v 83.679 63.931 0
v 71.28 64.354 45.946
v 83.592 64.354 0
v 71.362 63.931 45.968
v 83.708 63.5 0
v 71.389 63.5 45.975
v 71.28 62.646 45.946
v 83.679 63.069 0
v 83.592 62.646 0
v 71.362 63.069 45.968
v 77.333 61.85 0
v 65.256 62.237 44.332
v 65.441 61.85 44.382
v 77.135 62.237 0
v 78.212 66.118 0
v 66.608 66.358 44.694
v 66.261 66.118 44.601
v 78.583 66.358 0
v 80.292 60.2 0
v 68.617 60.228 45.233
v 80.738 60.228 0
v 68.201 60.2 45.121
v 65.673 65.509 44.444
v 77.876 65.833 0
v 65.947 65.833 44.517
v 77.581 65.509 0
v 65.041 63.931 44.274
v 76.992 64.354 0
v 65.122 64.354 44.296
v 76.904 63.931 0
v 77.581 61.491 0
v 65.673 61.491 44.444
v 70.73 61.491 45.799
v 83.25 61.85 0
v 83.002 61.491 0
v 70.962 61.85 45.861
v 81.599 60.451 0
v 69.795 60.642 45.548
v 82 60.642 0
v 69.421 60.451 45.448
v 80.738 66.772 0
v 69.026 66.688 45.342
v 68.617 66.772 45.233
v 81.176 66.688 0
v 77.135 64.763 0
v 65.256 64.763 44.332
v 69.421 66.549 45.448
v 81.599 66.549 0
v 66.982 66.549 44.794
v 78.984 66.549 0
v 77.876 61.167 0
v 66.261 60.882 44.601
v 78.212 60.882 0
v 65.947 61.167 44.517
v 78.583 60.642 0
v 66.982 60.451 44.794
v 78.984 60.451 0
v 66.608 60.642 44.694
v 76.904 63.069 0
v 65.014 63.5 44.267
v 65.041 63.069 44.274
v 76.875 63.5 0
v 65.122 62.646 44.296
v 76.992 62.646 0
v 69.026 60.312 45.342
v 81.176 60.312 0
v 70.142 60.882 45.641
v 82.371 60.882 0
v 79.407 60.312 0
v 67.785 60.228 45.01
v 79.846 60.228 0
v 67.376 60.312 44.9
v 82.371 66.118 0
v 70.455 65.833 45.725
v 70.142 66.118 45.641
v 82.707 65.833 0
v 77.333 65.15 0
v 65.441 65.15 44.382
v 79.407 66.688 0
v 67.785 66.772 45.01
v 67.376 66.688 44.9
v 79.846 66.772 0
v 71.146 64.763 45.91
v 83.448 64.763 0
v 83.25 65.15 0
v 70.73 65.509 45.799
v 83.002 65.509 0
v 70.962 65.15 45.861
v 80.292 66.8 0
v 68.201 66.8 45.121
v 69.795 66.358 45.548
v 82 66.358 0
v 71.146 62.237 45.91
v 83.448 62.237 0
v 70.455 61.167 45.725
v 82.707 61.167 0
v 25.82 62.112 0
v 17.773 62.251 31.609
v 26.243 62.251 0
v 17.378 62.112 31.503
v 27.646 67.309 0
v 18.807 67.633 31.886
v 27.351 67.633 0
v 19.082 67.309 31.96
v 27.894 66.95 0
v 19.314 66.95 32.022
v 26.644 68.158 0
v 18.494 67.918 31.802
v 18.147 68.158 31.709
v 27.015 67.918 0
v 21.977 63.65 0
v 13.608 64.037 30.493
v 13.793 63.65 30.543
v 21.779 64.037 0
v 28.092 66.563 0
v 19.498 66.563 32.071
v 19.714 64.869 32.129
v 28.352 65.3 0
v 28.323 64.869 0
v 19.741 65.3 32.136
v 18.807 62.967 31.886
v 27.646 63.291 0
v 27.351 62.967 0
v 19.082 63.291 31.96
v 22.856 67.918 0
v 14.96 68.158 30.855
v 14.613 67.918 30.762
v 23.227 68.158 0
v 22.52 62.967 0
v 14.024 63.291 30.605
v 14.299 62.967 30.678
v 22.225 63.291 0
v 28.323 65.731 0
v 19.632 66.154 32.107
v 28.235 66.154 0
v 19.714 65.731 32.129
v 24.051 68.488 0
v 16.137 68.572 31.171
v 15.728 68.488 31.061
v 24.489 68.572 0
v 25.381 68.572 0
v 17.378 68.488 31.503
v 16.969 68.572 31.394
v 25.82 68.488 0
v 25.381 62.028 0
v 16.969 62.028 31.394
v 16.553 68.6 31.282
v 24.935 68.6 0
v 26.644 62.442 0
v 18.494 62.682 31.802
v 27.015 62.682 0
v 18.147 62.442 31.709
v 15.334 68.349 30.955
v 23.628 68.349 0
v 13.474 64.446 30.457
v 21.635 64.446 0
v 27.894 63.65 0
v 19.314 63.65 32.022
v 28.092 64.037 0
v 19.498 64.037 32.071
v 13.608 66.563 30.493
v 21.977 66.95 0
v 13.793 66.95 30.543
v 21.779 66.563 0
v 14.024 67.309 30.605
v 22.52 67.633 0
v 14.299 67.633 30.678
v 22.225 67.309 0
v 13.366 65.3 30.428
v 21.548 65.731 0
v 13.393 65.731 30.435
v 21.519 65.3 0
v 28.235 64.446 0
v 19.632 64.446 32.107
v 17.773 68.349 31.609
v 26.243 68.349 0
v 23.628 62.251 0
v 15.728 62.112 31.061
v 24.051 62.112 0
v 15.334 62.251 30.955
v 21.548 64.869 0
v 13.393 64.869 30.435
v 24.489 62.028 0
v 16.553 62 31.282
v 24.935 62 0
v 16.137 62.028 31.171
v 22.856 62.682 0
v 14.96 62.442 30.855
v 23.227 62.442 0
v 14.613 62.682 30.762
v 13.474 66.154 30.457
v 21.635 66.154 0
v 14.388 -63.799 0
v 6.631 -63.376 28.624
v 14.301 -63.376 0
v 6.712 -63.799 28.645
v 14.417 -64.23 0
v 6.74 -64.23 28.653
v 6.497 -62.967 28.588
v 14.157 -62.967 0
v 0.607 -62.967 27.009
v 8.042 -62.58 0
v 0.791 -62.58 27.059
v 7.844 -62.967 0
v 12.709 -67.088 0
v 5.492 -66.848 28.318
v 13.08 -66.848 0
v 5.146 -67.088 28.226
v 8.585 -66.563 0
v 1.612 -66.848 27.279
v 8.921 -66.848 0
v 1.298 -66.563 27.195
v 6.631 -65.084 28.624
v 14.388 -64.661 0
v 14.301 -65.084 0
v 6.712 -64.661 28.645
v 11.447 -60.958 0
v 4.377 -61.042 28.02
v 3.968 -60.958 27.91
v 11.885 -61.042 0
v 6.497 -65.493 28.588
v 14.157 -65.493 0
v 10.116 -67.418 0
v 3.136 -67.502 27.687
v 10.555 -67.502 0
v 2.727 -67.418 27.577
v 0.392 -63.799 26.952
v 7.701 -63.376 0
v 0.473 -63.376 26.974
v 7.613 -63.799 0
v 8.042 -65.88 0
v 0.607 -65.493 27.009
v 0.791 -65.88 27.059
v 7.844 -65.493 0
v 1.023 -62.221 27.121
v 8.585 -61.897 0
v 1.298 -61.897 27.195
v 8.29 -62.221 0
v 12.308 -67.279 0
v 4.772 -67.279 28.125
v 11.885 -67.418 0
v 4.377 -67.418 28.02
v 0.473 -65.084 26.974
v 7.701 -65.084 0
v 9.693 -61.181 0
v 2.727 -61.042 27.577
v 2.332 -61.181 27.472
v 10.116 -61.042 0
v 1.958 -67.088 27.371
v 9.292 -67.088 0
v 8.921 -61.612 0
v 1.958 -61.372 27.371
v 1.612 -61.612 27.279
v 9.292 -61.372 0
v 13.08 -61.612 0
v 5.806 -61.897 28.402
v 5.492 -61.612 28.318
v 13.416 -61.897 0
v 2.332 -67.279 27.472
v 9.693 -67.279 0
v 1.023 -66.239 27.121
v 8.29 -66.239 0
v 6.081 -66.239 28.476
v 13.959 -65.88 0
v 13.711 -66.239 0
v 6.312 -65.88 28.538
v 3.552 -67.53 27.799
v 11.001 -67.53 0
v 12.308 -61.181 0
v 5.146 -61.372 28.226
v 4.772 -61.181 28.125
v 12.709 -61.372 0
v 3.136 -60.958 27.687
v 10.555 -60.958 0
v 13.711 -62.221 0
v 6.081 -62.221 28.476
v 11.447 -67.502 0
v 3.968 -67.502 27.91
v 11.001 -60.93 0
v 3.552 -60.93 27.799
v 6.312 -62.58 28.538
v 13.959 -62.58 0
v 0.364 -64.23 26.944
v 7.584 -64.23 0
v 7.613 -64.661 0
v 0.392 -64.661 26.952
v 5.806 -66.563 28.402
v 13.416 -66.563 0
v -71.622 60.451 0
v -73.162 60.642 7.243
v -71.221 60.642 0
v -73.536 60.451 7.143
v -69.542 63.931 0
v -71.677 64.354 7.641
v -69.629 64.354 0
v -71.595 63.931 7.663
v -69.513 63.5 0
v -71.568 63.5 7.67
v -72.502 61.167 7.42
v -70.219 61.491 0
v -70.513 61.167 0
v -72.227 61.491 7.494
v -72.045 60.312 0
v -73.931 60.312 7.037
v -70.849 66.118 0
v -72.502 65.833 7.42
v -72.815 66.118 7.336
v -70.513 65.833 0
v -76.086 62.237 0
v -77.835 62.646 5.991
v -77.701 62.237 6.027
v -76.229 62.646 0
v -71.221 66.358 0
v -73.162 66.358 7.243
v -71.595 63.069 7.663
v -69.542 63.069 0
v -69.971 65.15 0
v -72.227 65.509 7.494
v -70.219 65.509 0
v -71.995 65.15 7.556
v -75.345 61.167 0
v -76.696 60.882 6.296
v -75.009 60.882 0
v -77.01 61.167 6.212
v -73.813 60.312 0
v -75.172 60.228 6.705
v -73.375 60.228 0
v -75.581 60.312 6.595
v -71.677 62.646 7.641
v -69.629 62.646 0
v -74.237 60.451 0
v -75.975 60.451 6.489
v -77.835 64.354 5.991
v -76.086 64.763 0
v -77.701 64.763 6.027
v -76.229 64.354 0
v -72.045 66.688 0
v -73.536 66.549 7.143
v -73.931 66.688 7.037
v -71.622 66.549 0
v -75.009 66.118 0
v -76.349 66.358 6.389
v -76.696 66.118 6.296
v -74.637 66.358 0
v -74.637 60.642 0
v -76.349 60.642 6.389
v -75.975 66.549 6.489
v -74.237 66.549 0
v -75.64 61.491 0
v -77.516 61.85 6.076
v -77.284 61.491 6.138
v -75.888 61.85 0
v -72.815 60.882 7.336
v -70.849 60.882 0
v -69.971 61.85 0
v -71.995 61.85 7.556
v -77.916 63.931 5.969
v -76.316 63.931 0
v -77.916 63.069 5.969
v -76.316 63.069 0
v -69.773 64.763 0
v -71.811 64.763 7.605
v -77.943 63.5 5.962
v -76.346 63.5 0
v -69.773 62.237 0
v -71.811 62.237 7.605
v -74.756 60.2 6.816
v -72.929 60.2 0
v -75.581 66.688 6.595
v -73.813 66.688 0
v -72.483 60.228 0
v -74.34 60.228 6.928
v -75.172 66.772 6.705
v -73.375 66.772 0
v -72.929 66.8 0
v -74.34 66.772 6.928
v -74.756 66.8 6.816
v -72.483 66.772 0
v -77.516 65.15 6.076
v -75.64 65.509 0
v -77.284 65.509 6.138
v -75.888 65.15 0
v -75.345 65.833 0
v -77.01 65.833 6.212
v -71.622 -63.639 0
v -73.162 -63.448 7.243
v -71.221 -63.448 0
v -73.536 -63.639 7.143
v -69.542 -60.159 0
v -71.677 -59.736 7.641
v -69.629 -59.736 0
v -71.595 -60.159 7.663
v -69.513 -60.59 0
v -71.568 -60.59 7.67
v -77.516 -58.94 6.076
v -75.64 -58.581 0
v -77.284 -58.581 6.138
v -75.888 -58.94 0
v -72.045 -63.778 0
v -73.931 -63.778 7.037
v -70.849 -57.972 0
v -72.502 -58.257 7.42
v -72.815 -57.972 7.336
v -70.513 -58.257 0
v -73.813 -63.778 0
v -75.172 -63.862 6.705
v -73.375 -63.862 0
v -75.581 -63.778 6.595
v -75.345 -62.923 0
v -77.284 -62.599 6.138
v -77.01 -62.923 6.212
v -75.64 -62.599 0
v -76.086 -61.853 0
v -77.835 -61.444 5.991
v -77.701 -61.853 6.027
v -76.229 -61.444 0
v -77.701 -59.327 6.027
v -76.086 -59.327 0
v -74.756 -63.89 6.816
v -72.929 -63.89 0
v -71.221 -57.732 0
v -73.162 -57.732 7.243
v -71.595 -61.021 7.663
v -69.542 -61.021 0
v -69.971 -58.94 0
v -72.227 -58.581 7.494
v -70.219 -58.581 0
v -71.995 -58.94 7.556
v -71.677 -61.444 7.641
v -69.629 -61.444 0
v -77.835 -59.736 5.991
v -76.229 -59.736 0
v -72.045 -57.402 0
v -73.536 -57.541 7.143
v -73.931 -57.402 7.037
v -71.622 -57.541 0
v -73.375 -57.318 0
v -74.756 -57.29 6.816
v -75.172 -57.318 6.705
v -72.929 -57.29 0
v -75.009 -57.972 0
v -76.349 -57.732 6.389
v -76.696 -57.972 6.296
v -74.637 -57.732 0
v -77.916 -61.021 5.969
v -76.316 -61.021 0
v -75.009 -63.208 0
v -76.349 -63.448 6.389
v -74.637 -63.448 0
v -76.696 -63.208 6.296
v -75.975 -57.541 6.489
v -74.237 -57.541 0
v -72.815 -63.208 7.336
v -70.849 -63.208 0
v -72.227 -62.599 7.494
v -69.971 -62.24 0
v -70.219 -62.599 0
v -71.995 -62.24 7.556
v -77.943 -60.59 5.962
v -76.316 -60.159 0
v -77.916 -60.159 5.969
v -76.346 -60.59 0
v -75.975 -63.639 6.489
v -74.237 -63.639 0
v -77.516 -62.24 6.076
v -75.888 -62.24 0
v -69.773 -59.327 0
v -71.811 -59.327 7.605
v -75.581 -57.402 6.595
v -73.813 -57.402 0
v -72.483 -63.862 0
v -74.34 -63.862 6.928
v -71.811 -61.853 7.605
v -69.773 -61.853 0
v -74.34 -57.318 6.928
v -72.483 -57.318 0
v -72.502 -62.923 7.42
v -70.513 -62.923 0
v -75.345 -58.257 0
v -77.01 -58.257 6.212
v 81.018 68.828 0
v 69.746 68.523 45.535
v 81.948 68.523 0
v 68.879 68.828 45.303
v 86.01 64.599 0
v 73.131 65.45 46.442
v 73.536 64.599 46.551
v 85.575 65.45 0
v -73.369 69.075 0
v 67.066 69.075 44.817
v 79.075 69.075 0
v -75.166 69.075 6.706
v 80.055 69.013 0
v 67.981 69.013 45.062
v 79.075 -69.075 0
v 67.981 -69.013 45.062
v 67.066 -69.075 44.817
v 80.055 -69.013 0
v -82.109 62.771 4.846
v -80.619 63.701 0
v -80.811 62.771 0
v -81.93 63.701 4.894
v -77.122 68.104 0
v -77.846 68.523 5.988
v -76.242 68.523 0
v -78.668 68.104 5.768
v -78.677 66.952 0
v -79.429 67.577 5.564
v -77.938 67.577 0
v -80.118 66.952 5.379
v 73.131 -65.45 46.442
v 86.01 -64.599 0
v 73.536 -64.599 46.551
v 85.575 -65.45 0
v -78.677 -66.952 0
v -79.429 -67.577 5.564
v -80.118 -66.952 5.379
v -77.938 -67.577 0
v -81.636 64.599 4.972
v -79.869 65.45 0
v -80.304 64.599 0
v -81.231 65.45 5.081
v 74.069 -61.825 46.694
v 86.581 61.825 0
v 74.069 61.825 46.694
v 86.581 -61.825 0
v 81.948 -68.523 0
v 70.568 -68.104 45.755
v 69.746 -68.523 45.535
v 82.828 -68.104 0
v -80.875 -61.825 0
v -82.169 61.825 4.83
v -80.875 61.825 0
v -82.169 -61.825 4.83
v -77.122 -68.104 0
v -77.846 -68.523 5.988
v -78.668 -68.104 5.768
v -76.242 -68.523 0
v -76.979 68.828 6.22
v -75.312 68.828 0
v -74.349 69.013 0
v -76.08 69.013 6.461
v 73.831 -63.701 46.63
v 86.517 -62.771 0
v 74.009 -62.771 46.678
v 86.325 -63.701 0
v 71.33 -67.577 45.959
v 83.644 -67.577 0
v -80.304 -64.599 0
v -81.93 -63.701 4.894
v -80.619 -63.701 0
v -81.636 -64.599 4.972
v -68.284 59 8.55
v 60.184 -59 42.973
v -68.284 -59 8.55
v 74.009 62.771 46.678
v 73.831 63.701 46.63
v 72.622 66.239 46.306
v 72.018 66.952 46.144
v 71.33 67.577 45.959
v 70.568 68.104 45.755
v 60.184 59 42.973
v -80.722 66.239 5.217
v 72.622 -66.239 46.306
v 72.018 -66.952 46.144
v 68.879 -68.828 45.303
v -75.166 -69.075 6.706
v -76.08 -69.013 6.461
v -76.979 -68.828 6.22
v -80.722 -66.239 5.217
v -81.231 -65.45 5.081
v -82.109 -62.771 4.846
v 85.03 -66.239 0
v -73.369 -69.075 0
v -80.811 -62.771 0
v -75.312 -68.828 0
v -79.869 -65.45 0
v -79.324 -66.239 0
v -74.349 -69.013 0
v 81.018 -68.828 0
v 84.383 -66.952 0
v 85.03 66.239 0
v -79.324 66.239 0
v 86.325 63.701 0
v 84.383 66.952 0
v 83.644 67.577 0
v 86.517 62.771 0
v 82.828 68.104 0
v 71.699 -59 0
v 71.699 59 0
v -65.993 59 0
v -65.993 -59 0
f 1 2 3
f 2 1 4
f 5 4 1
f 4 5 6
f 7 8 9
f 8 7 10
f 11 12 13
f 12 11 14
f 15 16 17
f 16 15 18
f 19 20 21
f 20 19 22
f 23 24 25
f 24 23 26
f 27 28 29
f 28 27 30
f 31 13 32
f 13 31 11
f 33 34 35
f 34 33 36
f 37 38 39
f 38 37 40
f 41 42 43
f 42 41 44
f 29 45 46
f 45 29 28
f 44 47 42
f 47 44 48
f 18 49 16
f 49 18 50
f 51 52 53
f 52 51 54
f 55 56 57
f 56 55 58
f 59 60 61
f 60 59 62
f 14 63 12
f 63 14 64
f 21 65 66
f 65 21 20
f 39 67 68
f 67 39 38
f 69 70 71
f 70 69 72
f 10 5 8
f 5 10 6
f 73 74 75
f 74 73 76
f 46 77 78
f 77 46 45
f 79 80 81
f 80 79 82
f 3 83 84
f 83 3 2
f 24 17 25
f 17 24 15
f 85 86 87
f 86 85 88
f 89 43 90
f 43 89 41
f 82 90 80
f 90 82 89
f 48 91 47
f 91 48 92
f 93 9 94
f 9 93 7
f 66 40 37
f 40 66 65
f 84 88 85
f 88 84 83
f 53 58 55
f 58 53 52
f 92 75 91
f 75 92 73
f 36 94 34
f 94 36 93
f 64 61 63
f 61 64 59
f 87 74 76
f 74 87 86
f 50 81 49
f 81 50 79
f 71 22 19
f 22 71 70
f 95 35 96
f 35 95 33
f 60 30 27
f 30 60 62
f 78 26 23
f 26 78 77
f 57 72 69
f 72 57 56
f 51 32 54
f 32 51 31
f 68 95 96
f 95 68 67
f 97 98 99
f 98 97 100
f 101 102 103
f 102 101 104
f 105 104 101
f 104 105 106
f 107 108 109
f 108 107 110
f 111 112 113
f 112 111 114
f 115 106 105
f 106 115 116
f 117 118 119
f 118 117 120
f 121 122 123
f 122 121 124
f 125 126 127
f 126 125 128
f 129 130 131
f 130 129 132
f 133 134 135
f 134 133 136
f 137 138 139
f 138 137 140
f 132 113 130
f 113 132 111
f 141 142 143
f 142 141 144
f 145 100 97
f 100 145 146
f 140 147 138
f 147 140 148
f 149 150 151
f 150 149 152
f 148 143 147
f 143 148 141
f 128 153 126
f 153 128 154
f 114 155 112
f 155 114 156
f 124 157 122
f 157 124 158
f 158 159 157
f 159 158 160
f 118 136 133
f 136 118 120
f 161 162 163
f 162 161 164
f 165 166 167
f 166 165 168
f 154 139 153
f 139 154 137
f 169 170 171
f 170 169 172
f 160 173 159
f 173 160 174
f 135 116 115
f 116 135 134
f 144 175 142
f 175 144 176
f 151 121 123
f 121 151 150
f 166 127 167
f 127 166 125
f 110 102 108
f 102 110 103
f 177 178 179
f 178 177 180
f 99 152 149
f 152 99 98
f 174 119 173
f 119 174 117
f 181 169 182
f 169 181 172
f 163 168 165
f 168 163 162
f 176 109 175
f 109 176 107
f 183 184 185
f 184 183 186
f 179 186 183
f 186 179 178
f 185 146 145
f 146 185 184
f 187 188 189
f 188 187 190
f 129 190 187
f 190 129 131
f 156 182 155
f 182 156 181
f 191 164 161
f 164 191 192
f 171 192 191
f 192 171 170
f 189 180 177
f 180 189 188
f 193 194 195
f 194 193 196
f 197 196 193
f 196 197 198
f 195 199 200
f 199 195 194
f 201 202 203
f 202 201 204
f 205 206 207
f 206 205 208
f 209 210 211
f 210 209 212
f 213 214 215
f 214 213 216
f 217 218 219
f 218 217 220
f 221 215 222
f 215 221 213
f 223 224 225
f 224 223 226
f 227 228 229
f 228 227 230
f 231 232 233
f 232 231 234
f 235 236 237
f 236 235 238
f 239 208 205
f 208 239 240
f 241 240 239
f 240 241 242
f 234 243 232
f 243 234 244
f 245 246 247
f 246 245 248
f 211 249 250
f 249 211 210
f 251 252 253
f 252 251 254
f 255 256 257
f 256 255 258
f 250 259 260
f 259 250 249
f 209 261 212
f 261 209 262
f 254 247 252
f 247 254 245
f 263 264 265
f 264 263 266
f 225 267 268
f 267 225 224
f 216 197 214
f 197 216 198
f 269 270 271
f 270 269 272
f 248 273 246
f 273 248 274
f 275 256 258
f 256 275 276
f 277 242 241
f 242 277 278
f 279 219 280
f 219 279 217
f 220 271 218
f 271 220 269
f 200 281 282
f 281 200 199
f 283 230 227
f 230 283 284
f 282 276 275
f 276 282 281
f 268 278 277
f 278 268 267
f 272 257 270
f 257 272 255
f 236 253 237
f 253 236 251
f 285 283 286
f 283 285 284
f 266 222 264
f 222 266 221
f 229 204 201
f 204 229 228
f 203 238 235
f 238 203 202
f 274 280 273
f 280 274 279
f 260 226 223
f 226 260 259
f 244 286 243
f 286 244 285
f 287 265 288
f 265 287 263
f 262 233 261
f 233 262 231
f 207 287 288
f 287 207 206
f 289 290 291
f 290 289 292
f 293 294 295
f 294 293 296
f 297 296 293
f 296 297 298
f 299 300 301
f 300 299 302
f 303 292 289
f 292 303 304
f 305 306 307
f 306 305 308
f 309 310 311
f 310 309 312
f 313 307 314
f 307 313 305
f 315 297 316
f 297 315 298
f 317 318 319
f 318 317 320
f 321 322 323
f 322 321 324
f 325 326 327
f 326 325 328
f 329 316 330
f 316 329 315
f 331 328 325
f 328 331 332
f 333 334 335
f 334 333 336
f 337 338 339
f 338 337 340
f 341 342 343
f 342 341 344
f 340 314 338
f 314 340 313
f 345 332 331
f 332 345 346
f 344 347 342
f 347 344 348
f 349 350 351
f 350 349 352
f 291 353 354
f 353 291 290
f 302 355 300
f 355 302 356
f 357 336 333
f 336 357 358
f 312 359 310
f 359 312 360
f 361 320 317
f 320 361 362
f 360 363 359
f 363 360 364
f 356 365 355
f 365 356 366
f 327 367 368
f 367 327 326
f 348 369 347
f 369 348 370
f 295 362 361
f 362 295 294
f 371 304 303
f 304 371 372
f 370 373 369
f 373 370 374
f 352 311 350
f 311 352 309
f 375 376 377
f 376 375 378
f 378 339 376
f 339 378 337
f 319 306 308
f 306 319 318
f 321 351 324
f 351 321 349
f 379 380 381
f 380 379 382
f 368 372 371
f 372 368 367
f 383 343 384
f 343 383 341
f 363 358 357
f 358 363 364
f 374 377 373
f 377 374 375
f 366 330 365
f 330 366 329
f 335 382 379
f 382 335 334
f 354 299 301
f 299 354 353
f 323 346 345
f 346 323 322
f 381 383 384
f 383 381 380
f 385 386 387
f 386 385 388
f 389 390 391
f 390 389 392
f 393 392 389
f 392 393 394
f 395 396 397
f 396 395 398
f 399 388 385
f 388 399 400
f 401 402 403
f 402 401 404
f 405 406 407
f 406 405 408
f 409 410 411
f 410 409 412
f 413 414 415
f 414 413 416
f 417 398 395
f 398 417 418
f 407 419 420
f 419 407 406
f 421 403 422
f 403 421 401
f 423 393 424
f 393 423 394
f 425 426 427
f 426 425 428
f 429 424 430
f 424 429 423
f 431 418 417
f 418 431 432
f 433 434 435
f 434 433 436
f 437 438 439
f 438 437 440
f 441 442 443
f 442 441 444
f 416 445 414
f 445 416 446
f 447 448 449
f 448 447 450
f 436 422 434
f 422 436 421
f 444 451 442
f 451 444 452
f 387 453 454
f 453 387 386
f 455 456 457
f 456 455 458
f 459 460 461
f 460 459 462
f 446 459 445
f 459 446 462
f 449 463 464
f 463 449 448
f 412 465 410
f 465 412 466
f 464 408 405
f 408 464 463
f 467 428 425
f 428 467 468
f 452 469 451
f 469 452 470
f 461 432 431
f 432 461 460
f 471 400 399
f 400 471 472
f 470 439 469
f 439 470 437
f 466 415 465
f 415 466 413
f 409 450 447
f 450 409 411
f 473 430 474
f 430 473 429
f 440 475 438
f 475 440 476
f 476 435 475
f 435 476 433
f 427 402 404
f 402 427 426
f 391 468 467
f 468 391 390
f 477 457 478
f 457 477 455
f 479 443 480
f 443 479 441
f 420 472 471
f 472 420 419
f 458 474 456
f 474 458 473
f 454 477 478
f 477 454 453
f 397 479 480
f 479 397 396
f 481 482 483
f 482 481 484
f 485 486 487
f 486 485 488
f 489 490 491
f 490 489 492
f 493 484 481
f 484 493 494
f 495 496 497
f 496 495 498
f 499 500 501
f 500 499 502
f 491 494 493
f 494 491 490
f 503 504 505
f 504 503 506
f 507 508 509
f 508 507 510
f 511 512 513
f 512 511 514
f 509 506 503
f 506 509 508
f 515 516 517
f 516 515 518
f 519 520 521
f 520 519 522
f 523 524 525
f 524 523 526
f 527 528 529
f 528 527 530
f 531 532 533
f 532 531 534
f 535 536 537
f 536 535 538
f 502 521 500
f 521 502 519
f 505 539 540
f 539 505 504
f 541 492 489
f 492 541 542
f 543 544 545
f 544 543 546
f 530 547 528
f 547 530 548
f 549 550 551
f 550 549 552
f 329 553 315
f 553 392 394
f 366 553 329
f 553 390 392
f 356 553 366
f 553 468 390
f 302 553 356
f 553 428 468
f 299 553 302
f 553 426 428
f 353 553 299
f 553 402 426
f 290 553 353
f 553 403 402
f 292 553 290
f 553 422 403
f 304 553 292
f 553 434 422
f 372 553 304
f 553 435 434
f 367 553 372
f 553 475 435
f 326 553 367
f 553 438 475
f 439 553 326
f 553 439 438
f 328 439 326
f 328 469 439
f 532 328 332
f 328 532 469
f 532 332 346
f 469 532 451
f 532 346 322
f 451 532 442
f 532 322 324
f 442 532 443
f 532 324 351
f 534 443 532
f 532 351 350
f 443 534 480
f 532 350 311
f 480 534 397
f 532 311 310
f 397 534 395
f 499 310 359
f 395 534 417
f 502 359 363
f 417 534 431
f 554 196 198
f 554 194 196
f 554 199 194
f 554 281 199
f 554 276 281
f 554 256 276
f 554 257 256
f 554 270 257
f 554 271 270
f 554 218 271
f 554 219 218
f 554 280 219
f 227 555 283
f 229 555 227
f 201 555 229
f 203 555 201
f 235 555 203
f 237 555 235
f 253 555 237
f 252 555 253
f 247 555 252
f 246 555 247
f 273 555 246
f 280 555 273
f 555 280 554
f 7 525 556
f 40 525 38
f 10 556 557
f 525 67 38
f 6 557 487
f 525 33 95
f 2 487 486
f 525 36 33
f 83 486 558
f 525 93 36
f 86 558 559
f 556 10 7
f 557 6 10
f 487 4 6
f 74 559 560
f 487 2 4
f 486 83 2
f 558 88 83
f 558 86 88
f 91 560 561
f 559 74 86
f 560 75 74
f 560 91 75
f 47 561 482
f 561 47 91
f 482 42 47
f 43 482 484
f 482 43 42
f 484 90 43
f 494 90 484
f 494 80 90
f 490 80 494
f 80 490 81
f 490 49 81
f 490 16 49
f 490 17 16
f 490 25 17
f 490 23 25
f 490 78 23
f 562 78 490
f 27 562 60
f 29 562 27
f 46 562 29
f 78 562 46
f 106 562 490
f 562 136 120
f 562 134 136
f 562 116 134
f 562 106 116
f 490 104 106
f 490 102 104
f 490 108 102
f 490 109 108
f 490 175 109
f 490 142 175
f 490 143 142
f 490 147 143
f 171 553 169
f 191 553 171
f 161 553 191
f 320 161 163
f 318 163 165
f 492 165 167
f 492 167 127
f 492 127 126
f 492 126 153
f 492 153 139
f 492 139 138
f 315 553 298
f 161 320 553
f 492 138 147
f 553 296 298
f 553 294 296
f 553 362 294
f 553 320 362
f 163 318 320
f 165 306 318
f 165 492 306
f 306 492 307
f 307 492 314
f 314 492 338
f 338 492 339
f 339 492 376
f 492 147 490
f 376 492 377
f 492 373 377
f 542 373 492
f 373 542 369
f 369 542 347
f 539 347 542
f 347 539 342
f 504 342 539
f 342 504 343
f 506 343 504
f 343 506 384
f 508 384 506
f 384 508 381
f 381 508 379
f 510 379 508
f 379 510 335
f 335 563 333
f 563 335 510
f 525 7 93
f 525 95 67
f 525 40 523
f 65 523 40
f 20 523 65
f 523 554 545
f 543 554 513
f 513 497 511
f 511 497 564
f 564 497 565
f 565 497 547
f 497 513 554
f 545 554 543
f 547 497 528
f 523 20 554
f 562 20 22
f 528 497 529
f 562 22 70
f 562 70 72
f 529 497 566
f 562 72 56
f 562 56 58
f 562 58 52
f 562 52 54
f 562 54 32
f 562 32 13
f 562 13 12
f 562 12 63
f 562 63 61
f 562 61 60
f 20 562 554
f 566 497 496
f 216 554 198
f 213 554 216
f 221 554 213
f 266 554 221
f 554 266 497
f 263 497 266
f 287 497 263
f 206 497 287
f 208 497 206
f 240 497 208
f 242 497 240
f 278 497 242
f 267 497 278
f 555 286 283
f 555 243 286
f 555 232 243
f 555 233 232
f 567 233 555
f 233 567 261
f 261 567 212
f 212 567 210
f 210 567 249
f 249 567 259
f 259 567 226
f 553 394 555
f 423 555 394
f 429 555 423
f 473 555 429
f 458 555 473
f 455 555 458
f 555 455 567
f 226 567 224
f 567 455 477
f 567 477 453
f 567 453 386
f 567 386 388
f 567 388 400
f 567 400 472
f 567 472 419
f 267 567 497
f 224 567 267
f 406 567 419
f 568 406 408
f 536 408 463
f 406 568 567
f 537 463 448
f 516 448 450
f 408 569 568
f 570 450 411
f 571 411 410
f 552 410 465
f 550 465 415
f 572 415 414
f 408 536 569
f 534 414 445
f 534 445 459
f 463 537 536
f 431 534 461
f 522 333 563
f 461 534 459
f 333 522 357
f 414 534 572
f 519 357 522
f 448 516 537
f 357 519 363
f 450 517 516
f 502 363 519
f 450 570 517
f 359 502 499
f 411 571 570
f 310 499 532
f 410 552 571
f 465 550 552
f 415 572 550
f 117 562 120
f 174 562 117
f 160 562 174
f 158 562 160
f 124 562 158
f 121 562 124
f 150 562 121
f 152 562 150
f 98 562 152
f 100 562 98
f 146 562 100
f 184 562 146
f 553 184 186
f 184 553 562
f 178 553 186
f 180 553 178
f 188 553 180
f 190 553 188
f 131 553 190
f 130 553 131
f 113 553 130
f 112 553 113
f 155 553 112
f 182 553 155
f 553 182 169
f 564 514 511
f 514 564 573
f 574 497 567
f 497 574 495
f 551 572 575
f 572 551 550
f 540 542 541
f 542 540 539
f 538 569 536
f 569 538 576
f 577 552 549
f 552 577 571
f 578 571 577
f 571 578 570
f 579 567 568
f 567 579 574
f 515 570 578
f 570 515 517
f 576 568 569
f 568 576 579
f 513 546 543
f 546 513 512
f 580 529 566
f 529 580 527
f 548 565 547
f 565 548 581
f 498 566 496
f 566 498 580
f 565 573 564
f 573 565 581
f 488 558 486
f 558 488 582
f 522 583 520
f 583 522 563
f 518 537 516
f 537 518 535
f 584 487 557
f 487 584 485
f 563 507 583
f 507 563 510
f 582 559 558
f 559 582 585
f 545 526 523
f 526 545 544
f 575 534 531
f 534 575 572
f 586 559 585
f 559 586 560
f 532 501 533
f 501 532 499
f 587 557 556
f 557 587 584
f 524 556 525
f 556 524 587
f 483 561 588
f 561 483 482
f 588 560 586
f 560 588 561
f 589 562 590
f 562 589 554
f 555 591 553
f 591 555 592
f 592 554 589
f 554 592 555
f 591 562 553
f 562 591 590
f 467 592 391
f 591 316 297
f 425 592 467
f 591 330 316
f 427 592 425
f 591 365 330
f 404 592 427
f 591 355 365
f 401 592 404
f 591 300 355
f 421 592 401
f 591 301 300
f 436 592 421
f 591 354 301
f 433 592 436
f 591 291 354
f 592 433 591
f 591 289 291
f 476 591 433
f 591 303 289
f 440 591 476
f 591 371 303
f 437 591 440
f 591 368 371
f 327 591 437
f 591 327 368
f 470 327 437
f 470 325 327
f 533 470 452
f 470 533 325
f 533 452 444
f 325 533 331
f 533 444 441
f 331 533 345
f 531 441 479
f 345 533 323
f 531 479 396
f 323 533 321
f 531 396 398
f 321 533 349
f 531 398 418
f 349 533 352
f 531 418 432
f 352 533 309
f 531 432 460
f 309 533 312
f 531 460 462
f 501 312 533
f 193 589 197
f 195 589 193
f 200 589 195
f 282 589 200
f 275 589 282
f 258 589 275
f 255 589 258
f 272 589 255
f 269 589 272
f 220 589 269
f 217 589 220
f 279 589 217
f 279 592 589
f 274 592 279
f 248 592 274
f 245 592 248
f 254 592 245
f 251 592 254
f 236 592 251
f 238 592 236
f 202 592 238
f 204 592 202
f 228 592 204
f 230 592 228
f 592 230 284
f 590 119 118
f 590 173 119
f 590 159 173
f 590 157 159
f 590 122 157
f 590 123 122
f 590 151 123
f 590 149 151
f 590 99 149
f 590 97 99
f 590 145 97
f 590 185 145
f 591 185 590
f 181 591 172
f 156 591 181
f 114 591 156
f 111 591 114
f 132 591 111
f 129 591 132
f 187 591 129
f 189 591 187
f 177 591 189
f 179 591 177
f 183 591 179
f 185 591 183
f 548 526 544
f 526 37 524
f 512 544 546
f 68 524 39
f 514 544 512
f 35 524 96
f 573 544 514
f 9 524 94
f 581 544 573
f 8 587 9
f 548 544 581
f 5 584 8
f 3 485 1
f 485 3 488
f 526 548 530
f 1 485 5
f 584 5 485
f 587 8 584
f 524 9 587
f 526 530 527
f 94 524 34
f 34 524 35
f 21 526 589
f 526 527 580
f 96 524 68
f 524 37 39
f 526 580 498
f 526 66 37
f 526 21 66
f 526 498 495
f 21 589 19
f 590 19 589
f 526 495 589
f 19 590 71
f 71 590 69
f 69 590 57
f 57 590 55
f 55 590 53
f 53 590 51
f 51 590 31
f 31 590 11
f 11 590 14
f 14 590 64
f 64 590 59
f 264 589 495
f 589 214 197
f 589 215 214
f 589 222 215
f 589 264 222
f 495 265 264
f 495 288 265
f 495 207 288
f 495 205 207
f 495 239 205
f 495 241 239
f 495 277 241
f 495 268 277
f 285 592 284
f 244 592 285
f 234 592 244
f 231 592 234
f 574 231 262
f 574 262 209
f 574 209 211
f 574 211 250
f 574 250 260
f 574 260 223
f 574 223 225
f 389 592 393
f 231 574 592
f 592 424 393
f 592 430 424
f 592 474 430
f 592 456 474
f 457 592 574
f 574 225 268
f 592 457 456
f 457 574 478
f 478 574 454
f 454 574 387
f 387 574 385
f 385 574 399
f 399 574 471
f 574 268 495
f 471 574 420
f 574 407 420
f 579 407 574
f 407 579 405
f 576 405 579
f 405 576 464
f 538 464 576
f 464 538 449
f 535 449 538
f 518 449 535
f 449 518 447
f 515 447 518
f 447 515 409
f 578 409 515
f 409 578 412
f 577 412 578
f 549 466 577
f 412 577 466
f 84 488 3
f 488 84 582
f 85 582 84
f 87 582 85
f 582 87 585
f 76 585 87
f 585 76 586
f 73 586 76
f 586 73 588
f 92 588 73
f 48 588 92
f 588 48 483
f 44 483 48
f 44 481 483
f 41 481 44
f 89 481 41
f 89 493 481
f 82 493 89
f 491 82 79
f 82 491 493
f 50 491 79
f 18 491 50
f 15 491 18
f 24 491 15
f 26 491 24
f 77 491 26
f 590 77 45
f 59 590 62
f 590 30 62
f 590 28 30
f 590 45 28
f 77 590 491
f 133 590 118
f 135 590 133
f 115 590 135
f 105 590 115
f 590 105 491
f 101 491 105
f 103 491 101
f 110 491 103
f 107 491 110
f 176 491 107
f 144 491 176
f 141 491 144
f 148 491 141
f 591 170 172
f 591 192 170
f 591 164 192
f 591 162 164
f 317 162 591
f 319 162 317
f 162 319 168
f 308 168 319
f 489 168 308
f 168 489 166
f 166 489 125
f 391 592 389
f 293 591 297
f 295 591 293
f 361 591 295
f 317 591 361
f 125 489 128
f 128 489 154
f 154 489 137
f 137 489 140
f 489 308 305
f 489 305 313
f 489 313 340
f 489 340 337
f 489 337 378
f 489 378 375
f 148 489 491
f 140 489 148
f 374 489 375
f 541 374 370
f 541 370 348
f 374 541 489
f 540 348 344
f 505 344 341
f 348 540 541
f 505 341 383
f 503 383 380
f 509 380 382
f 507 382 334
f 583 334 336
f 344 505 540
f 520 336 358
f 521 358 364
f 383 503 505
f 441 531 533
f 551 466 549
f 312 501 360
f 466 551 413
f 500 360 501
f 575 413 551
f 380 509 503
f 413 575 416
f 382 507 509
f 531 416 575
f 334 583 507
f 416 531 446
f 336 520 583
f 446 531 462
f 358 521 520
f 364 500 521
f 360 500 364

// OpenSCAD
$fn=48;
// how much tenting you want
tilt = 15;
// how round the corners are
corner_roundness = 7.25;
// width of the entire base top
width = 161.75;
// height of the entire base top
height = 138.15;
// how tall the shortest part of the tenting will be - 0 doesn't have enough
// room for the screws
lift=5;

// radius of screw holes
screw_hole_radius = 3.3;

// which side to render;
$side = "left"; // [left, right]

 module tent() {
     intersection() {
      rotate ([180,0-tilt,0]) {
        // this allows us to rotate on the furthest edge of the model, allowing
        // for a range of tilts
        translate([width/2,0,0]){
        difference () {
           base();
           // we need to flip the base upside down so it extrudes downwards,
           // but the screws are not symmetrical - so this corrects
           rotate([-180,0,0]) {
             screw_holes();
           }
           middle_cube();
         }
       }
     }
       // cuts off tenting at the bottom
       translate([width/2,0,0]) envelope();
     }
   }

module base() {
  translate([0,0,-lift]) {
    linear_extrude(height=150) { // this extrudes down, so it just always needs to get to the bottom
      offset(r=corner_roundness) {
        square([width - corner_roundness*2, height - corner_roundness*2], center=true);
      }
    }
  }
}

module screw_holes() {
  screw_hole_positions = [
    [74.80,63.5,0],
    [21.33,65.30,0],
    [23.62-15.75,-64.23,0],
    [-73.2,63.5,0],
    [-73.2,-60.59],
  ];

  for(screw_hole_position = screw_hole_positions) {
    translate(screw_hole_position) {
      cylinder (h=150, r=screw_hole_radius, center=true);
    }
  }
}

module envelope() {
  translate ([0,0,125]) {
    cube([width * 2, height * 2, 250], center=true);
  }
}

module side_cube() {
  translate ([-105.833333333,0,0]) {
    scale(0.28) {
      //%cube([700, 700, 150], center=true);
    }
  }
}

module middle_cube() {
  cube([133, 118,250], center=true);
}

module right() {
  translate([width/2, 0,0]) mirror([1, 0, 0]) tent();
}

module left() {
  translate([-width/2, 0,0]) mirror([0, 0, 0]) tent();
}

if ($side == "left") {
  left();
} else {
  right();
}
